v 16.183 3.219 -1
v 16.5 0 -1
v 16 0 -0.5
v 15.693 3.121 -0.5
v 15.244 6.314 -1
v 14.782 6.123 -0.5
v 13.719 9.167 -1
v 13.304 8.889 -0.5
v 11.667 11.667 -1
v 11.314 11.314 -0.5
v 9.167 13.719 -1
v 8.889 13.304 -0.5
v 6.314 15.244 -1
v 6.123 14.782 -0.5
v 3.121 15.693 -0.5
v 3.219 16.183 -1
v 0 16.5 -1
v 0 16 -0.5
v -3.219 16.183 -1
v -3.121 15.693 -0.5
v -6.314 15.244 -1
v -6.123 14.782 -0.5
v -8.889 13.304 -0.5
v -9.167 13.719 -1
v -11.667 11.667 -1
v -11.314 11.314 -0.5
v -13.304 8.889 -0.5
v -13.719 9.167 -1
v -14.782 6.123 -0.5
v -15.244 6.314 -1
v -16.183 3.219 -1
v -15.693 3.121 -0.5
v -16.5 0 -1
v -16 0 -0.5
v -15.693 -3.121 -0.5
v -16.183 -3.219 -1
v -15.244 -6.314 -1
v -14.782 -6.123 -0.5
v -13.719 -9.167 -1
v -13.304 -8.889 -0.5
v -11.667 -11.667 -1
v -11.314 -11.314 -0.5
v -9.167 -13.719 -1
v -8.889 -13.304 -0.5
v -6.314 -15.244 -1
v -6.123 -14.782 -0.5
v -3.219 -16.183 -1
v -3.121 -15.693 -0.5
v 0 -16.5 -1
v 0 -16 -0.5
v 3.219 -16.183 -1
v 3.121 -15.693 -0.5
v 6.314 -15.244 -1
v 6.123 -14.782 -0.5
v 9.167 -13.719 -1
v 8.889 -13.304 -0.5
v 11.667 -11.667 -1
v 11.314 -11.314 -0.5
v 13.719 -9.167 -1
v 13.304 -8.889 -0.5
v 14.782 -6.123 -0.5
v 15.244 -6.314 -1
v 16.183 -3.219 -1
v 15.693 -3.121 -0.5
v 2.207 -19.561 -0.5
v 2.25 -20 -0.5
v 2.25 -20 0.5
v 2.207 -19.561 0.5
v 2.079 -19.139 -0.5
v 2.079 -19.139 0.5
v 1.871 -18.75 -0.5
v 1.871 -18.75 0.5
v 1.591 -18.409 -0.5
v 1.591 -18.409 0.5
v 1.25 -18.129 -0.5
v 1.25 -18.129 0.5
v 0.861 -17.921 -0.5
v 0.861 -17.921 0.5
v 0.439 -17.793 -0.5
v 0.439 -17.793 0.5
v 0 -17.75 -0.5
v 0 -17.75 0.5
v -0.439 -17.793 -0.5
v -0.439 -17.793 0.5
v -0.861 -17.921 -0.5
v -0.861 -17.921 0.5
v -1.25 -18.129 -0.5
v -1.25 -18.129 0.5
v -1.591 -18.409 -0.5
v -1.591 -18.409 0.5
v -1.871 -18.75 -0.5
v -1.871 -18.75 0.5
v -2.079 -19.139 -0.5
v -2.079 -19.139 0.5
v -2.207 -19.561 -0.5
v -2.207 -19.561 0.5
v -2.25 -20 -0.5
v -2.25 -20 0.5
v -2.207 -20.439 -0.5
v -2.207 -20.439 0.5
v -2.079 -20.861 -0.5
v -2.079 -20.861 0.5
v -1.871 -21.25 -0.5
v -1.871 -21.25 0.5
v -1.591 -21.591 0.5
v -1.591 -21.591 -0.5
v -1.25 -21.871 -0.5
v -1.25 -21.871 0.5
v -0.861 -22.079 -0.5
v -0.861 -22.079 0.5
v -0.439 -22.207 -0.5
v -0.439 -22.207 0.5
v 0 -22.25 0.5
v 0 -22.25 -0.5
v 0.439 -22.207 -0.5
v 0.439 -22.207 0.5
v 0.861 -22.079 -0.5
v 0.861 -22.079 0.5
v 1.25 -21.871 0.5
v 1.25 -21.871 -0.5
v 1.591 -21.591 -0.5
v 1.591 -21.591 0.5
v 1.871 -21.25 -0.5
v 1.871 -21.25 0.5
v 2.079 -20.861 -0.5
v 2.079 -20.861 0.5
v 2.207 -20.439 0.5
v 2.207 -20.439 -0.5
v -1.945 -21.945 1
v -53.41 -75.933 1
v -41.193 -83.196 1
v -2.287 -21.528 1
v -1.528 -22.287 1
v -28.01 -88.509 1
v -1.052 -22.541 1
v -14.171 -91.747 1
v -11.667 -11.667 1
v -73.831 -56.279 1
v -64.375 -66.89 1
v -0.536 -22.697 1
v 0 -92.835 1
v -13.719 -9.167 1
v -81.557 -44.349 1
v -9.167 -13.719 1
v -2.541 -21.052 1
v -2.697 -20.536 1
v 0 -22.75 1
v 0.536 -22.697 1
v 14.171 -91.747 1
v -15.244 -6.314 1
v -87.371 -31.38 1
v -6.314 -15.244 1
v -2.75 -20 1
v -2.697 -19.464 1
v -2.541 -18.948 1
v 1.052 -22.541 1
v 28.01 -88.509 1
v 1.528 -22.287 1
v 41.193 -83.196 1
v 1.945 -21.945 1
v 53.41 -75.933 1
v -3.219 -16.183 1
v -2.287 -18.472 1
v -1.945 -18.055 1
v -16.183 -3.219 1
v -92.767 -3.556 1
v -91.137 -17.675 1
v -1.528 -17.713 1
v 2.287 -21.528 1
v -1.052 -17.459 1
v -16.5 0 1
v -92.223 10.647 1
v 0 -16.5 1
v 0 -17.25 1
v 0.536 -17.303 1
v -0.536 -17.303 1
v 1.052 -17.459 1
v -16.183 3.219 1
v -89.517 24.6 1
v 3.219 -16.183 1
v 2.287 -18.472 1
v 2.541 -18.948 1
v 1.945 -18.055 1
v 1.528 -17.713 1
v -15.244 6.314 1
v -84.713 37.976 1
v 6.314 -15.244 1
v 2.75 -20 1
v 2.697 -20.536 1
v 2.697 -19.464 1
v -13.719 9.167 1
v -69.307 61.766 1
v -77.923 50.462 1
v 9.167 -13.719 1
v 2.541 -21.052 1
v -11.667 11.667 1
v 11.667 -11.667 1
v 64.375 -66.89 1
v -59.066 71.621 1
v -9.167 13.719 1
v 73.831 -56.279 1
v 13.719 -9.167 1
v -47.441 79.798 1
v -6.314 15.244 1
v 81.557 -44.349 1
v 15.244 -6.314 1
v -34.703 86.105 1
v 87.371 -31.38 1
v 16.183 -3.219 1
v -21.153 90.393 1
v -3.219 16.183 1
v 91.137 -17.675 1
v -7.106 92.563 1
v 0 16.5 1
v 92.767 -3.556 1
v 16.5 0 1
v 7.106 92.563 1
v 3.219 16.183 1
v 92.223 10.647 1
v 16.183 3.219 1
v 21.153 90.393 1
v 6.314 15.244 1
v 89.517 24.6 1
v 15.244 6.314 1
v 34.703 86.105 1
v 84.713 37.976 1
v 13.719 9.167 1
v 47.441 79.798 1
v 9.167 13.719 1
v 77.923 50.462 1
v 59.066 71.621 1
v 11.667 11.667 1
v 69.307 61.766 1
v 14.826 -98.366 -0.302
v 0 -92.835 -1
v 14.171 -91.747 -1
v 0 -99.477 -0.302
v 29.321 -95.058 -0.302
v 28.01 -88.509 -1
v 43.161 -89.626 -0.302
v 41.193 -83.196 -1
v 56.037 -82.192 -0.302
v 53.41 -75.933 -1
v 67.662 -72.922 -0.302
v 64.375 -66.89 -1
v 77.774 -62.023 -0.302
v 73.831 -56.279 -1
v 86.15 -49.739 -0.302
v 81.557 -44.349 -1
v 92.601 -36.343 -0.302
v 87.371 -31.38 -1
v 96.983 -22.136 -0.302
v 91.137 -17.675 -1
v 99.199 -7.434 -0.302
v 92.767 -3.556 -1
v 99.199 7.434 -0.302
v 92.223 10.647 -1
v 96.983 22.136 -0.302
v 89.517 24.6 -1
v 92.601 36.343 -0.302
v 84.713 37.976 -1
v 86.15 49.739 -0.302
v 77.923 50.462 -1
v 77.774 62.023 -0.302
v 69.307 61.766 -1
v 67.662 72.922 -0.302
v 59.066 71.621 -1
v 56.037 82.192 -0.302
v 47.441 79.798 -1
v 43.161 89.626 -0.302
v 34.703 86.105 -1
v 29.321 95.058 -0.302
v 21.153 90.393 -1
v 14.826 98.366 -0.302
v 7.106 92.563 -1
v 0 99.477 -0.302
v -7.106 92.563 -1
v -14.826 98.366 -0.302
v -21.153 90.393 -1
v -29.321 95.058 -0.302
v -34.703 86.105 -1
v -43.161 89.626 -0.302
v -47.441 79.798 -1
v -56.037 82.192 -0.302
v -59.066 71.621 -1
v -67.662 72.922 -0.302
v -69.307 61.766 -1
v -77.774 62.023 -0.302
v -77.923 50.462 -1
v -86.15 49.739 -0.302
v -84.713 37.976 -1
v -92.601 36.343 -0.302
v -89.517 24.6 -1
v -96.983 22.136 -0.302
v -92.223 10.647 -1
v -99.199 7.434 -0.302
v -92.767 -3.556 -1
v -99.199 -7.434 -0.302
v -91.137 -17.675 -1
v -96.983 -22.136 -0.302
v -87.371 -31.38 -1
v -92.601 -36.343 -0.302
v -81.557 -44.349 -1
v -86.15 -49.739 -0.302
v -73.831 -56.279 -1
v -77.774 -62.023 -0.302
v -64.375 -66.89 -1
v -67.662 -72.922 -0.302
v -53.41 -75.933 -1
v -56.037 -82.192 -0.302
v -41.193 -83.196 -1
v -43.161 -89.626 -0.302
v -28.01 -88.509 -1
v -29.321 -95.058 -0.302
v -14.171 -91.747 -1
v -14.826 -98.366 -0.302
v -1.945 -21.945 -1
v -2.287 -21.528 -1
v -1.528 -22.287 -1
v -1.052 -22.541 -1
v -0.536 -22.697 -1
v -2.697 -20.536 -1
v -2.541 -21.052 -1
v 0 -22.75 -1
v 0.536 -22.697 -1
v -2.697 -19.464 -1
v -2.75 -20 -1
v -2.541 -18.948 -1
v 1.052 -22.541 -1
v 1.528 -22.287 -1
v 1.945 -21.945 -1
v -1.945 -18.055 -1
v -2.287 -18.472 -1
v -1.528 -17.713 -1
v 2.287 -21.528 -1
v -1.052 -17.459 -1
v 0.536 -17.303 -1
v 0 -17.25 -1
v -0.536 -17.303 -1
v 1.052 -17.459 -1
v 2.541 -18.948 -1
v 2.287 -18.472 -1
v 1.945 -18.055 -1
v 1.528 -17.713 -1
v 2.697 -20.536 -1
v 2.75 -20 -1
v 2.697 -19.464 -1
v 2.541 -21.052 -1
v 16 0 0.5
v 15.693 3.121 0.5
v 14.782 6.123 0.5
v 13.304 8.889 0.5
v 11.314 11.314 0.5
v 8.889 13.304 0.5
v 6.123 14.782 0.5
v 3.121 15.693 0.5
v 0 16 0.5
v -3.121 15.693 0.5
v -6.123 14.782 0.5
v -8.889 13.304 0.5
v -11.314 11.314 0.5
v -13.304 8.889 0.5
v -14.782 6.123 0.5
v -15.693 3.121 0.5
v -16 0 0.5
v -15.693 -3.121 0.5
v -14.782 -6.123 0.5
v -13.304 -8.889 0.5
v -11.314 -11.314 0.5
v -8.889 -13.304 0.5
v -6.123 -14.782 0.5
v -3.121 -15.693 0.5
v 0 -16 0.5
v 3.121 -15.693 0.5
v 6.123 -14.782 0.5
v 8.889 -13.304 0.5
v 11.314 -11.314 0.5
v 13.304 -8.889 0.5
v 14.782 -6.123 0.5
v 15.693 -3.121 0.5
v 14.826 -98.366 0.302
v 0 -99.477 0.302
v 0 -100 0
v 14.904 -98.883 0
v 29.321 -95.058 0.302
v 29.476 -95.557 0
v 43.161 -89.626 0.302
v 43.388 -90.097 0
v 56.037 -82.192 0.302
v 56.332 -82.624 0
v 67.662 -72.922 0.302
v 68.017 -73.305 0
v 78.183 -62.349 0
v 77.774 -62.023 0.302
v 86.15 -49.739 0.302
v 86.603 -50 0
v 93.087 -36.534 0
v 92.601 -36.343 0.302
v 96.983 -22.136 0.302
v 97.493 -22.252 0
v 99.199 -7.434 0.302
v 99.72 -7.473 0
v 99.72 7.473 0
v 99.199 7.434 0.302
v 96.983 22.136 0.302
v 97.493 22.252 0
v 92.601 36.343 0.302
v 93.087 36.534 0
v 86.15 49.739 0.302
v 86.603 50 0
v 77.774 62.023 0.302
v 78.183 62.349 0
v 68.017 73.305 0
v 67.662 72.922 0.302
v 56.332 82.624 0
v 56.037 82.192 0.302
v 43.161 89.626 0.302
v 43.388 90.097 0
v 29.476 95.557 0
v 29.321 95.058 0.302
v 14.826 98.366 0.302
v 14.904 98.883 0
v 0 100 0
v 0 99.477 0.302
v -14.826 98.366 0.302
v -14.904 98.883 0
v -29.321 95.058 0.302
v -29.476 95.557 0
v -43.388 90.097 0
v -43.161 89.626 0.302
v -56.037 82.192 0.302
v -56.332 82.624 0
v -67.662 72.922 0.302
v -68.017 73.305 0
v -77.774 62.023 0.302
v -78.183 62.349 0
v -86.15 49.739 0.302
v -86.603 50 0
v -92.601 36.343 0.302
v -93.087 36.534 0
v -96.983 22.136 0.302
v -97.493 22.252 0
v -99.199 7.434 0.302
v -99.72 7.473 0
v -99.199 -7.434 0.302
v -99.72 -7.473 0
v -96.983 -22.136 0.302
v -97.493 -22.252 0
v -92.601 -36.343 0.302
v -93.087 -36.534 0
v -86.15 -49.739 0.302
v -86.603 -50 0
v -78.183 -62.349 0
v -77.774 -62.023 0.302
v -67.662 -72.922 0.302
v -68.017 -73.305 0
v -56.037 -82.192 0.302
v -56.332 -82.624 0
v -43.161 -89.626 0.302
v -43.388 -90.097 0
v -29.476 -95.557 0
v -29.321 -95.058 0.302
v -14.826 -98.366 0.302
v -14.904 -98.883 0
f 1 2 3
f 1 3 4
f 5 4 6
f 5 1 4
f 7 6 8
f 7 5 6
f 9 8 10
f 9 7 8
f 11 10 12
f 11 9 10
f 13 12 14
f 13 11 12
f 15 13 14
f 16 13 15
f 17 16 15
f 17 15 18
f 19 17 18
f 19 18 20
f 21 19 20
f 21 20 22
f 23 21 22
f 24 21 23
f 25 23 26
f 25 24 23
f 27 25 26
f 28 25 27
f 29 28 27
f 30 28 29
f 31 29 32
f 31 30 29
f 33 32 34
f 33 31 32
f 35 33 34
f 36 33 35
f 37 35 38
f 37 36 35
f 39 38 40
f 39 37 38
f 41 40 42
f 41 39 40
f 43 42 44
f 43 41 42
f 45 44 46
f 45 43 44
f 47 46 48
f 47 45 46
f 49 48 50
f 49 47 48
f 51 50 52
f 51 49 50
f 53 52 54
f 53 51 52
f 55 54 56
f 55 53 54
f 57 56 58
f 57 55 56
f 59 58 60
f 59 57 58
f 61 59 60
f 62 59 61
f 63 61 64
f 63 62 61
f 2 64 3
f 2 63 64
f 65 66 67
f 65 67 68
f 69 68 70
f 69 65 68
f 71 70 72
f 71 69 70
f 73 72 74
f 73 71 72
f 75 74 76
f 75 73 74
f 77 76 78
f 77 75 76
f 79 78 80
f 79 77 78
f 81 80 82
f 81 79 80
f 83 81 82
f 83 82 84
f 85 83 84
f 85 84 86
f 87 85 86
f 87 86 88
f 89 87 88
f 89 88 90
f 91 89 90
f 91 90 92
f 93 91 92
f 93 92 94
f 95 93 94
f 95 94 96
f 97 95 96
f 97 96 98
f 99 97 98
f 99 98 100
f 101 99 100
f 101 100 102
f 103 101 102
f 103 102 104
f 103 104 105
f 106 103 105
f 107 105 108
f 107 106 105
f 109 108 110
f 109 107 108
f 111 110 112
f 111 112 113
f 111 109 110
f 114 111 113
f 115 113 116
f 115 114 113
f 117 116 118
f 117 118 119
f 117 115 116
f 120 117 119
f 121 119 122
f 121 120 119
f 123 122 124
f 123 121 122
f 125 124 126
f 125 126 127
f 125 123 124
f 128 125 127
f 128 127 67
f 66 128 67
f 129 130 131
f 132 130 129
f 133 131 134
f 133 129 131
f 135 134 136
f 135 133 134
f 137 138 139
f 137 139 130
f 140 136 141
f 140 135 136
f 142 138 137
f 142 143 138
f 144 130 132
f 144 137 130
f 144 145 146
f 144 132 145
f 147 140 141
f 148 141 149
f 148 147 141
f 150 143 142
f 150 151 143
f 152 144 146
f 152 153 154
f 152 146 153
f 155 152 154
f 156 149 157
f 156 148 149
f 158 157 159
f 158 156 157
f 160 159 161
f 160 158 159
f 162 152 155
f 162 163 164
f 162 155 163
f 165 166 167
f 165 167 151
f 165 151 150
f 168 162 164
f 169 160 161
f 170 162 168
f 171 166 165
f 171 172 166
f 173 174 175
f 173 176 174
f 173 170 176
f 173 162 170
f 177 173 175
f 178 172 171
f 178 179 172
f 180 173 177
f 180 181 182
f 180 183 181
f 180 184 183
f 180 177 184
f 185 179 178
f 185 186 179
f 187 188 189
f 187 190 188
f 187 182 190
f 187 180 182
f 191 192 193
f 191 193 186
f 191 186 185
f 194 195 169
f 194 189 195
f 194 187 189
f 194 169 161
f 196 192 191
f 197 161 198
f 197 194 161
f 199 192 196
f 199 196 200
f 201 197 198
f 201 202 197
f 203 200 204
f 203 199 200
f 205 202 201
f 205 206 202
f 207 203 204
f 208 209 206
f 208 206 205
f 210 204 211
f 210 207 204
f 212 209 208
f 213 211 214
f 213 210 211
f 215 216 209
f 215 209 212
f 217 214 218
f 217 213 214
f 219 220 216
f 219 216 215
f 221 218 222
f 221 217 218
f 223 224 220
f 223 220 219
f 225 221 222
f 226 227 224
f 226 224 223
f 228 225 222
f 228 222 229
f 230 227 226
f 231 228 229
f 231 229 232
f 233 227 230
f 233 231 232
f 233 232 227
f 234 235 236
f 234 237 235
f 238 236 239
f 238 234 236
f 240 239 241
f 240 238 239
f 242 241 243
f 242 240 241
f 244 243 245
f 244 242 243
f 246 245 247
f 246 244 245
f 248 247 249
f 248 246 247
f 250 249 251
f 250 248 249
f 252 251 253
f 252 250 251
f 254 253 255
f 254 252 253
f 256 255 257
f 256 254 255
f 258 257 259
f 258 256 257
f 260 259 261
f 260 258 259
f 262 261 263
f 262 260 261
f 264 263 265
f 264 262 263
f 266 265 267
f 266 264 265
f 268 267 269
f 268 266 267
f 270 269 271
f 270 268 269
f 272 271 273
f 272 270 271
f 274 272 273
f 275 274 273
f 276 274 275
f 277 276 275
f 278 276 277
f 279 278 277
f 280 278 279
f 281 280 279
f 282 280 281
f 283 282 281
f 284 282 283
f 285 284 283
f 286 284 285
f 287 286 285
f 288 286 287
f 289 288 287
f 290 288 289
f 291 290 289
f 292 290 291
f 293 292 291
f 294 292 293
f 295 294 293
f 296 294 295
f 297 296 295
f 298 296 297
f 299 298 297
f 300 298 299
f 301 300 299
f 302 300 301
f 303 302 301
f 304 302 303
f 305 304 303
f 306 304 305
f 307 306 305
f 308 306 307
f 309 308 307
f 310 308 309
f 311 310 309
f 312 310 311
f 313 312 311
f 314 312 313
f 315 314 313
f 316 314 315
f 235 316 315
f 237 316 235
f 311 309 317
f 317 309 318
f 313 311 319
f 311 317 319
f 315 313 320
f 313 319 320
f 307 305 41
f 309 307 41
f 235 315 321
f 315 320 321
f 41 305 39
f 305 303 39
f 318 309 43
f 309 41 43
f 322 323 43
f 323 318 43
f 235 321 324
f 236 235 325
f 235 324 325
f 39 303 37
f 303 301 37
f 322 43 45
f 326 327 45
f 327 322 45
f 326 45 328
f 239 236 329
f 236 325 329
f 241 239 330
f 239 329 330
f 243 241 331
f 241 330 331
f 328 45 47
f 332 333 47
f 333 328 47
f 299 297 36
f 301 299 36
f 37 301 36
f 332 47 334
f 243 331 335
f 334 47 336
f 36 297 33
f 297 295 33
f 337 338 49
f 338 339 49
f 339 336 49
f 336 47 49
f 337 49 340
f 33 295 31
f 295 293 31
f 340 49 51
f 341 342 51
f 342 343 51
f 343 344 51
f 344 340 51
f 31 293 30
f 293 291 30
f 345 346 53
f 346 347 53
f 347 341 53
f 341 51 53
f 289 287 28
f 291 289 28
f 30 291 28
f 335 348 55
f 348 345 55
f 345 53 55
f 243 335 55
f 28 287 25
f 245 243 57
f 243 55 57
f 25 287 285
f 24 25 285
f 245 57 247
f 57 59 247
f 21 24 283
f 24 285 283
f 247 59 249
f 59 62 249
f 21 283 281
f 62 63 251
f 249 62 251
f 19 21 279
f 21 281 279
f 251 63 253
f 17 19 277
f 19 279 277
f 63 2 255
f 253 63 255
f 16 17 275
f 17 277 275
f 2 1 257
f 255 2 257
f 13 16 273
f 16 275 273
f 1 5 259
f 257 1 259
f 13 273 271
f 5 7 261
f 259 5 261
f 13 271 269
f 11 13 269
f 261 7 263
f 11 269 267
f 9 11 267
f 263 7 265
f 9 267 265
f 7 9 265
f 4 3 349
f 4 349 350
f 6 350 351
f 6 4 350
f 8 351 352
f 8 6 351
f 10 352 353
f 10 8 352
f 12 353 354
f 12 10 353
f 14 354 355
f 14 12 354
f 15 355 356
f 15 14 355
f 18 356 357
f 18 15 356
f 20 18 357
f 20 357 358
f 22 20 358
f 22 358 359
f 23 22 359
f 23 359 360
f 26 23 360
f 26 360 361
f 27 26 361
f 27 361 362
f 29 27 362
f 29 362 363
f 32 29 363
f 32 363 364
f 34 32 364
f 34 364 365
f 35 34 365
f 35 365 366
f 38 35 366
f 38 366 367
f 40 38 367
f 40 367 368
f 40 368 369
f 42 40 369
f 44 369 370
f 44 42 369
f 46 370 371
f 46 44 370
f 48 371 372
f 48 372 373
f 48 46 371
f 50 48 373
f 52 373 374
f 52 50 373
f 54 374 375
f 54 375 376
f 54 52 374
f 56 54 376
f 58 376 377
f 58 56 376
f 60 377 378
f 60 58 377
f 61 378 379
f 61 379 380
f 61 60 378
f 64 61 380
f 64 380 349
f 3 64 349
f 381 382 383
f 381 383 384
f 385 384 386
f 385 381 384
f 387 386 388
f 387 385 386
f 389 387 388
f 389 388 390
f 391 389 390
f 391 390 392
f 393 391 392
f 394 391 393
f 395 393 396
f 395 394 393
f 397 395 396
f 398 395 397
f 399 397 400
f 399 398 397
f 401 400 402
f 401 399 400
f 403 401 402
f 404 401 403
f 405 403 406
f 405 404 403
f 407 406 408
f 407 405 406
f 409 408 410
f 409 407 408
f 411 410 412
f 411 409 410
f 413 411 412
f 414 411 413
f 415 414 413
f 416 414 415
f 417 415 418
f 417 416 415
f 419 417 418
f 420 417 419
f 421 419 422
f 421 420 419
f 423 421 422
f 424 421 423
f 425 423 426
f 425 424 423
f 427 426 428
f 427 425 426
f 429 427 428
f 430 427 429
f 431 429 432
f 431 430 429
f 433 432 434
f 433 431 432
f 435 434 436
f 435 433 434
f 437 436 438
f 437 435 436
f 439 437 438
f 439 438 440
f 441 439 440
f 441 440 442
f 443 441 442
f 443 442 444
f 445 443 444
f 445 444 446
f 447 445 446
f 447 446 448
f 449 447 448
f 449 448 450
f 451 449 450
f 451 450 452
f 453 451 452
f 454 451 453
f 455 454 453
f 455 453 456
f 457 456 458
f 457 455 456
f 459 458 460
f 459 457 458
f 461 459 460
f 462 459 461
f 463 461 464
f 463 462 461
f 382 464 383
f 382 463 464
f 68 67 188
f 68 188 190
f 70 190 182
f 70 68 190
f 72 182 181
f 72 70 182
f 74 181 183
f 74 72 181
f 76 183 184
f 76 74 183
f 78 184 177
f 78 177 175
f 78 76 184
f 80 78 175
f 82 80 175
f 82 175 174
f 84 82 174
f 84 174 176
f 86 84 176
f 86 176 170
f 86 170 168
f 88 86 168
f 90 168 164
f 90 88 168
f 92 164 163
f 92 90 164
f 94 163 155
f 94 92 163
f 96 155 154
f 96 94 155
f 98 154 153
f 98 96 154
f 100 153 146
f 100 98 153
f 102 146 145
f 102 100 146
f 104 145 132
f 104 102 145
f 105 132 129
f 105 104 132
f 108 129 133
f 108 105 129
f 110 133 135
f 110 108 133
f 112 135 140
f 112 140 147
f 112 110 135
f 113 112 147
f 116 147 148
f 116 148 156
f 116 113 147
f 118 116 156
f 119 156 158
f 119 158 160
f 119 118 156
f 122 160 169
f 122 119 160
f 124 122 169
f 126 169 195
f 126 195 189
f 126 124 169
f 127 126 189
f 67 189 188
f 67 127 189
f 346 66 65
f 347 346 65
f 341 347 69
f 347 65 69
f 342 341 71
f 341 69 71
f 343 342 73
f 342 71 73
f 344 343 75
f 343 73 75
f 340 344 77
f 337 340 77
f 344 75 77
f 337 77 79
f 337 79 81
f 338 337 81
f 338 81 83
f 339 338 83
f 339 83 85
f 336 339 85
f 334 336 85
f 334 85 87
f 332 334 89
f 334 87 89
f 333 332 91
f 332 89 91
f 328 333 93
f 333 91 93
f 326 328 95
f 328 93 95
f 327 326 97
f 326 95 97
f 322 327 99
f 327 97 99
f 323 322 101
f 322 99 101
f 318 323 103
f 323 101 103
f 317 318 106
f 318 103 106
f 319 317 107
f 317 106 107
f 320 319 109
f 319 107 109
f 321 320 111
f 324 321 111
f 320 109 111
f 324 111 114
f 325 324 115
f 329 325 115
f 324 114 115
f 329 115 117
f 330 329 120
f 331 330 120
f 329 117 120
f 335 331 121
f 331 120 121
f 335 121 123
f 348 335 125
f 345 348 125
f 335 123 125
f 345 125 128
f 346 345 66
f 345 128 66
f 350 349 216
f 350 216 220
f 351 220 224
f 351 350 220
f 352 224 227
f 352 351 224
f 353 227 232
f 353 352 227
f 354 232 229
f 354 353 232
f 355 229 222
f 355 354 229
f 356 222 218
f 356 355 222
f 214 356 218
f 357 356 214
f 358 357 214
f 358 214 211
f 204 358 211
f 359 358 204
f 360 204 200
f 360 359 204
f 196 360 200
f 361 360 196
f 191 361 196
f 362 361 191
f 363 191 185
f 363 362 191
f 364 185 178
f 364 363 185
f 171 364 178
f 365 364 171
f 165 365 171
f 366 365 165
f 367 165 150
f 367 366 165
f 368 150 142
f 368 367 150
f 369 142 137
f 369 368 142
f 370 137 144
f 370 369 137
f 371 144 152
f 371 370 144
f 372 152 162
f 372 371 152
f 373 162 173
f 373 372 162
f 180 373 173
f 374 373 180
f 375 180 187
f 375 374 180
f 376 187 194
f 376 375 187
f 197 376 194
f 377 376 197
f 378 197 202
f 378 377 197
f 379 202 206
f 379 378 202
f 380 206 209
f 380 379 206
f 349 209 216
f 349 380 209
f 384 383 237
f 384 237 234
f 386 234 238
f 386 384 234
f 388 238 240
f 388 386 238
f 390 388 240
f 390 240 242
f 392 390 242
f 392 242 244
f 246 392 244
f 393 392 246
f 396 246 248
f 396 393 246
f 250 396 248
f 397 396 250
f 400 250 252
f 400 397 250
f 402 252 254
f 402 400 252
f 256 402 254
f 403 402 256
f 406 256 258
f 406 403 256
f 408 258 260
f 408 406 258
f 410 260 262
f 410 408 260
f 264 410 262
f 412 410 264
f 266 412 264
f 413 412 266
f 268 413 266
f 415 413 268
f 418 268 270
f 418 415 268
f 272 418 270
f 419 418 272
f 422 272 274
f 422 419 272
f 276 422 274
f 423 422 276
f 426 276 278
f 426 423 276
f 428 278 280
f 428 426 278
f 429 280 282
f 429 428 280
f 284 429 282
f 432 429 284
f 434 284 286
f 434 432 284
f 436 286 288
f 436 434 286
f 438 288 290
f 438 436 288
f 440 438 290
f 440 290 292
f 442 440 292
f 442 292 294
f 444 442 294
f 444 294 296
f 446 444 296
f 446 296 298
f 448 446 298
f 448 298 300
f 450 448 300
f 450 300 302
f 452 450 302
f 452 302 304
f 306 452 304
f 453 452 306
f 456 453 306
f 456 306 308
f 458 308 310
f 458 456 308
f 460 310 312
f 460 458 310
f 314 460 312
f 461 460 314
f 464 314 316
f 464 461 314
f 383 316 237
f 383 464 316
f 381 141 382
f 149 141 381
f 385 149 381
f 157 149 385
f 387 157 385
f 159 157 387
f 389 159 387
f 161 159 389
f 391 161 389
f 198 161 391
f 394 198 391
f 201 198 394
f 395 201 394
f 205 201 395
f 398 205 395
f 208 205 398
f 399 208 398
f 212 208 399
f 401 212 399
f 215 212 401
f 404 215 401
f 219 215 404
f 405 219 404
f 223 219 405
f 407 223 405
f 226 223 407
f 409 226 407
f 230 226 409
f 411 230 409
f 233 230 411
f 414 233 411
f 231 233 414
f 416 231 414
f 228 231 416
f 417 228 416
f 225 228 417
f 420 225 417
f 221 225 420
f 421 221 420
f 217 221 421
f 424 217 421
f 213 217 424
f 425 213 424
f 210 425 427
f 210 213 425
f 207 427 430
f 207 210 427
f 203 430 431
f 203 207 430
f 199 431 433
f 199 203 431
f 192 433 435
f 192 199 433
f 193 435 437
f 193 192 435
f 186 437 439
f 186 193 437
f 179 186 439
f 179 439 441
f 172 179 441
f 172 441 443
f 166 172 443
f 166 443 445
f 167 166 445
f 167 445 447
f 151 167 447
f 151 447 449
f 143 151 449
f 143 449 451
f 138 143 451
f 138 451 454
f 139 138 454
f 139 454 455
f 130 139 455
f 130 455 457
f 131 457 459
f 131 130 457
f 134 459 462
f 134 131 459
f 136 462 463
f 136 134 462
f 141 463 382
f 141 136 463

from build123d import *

# Parameters (mm, degrees)
F0_R     = 100
F0_R_2   = 2.25
F0_R_3   = 16
F1_DEPTH = 1
F4_SIZE  = 0.5


with BuildPart() as f1:
    # F0 (on Top) → F1 (new body, symmetric)
    with BuildSketch(Plane.XY):
        Circle(F0_R)
        with Locations((0, -20)):
            Circle(F0_R_2, mode=Mode.SUBTRACT)
        Circle(F0_R_3, mode=Mode.SUBTRACT)
    extrude(amount=F1_DEPTH, both=True)

    # F2 (on Right) → F3 (revolve, cut)
    with BuildSketch(Plane.YZ):
        Polygon((-100, 1.035245), (-100, 0), (-99.477045, 0.301928), (-92.5, 1.035245), align=None)
        Polygon((-99.477045, -0.301928), (-100, 0), (-100, -1.035245), (-92.5, -1.035245), align=None)
    revolve(axis=Axis((0, 0, 4.501528), (0, 0, 1)), mode=Mode.SUBTRACT)

    # F4
    f4_edges = [f1.edges().sort_by_distance(p)[0] for p in [
        (-16, 0, 1),
        (-16, 0, -1),
        (-2.25, -20, 1),
        (-2.25, -20, -1),
    ]]
    chamfer(f4_edges, length=F4_SIZE)


solid = f1.part
